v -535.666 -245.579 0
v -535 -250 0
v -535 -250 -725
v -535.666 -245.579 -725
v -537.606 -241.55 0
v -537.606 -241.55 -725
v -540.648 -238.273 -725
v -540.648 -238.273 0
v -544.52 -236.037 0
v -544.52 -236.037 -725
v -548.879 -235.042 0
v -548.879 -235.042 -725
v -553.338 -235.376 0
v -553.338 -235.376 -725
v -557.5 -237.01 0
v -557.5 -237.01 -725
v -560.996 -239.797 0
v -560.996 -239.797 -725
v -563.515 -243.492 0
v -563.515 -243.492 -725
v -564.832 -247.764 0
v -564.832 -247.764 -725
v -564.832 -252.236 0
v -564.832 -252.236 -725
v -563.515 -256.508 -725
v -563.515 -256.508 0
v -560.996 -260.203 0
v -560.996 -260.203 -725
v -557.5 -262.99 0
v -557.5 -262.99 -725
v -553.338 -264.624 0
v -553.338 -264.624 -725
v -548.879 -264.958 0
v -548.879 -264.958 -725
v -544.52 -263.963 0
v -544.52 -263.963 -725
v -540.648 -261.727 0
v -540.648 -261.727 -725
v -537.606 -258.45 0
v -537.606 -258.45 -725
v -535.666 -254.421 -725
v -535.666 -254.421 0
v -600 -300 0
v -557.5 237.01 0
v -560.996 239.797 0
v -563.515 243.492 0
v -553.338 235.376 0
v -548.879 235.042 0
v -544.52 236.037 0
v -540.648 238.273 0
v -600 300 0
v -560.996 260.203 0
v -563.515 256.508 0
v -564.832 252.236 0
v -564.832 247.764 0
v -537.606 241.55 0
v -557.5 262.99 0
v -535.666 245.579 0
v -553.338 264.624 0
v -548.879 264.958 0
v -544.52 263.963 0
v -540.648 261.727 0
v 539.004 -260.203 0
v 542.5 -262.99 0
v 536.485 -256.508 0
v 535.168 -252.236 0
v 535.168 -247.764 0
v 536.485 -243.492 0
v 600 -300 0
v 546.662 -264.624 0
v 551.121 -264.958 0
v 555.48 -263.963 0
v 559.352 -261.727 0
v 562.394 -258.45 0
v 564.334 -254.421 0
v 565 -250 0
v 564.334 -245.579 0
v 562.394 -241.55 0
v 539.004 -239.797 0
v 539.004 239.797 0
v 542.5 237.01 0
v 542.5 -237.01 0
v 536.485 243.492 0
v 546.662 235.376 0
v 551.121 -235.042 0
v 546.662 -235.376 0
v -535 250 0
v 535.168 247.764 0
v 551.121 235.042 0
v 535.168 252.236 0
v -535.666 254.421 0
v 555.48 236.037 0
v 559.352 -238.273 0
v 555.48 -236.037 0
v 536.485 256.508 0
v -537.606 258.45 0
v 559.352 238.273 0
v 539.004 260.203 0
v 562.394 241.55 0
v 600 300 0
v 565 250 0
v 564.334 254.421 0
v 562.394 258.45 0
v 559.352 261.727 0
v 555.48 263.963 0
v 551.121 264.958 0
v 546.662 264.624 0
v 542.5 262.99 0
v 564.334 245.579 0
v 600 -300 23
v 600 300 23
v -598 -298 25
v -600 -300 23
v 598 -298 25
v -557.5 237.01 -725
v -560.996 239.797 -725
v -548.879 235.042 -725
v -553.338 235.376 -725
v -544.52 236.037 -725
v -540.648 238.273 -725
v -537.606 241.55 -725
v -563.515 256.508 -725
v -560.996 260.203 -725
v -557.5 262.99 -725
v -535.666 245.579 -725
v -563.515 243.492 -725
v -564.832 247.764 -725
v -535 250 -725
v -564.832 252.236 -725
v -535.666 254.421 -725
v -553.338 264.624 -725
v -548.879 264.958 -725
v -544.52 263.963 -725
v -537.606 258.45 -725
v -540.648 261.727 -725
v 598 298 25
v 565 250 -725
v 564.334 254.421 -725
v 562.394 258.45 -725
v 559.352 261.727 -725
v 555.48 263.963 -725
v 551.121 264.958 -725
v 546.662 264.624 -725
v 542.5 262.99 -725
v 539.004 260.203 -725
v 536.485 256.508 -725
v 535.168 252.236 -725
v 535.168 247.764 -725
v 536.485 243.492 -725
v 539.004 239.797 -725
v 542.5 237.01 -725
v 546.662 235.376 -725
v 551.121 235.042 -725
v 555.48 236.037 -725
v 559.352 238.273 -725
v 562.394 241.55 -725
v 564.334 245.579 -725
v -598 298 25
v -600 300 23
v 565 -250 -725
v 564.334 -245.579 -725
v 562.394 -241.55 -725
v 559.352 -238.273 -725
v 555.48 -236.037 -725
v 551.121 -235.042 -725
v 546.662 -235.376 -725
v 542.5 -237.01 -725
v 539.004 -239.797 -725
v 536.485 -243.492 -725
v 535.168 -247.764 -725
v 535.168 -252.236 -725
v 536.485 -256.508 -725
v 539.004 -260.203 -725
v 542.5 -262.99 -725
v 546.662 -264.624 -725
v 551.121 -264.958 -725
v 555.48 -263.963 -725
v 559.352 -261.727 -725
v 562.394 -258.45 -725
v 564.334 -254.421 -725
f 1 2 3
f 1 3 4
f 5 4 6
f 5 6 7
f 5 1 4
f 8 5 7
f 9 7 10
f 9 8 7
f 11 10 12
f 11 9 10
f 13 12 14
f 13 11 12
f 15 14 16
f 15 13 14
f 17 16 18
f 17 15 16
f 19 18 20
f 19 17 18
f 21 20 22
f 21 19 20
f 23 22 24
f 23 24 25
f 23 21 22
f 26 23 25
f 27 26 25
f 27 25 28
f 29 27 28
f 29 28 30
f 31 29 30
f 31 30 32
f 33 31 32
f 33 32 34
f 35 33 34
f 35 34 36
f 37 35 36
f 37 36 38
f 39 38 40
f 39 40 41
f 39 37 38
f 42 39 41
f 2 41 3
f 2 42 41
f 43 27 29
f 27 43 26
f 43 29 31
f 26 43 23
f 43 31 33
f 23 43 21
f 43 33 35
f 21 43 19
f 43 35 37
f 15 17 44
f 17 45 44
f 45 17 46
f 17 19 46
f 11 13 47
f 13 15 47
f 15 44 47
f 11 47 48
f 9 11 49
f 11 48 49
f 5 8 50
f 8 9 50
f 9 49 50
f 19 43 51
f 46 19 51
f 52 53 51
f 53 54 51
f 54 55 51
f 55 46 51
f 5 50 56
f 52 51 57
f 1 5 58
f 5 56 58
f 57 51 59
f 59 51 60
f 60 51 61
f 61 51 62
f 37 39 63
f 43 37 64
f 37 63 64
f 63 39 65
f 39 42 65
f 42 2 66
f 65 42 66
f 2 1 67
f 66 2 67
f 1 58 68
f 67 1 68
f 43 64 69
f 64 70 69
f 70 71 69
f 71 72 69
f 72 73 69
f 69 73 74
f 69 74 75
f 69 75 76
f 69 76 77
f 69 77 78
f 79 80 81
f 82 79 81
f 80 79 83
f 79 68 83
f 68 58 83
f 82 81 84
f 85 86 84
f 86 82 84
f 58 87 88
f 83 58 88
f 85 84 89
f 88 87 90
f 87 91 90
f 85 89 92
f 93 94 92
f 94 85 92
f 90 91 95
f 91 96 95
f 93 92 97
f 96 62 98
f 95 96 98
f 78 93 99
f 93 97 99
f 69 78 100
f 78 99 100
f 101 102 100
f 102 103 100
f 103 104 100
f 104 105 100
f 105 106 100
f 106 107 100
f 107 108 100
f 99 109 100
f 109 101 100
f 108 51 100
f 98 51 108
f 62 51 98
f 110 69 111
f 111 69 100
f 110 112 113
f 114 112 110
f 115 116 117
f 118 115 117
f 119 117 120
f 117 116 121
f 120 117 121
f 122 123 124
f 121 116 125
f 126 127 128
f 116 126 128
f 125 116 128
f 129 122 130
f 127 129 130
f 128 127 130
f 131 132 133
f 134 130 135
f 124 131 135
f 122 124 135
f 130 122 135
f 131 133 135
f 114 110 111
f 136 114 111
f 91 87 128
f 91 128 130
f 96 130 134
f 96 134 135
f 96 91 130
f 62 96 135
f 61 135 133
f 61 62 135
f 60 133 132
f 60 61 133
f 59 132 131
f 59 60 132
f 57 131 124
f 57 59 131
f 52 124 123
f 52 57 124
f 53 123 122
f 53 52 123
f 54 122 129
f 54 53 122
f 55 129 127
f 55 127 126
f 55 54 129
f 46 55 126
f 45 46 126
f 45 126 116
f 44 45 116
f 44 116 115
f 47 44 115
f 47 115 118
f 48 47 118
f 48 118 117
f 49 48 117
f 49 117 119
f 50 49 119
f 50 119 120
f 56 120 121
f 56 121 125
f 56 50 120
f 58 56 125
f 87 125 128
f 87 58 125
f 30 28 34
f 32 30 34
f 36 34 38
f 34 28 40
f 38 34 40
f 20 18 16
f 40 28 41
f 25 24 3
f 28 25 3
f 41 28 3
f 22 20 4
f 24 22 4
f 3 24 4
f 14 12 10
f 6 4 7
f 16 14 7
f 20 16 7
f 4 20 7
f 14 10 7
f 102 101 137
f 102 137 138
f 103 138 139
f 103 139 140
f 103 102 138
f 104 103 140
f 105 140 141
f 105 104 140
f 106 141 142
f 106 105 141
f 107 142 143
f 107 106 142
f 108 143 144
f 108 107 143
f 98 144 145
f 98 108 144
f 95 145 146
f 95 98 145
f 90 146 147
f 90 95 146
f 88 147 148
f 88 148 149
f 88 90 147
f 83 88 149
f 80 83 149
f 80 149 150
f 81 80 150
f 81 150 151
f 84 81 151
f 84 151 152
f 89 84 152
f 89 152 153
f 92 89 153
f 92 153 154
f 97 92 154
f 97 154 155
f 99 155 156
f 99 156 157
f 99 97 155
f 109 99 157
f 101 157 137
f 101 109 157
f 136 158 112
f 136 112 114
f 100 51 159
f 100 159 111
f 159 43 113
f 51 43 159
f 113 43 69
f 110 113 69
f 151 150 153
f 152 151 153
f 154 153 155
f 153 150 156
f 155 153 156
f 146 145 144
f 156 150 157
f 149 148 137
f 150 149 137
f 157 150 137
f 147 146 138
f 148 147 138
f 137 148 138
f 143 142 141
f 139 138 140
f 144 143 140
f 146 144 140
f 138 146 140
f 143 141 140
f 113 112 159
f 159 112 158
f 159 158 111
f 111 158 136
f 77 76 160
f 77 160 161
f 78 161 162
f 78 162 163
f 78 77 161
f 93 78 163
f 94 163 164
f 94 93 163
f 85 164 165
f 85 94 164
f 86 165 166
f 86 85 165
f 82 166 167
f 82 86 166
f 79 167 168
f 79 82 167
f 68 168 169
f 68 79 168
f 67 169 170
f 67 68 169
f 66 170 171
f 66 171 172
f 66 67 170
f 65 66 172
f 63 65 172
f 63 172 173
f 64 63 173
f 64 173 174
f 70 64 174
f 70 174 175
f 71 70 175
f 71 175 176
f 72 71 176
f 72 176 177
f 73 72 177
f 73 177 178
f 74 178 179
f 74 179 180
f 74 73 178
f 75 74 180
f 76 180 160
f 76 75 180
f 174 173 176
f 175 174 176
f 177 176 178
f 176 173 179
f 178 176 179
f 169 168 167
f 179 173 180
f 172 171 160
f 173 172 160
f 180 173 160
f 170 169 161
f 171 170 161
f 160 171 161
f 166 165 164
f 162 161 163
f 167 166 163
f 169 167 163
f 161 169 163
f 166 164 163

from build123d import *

# Parameters (mm, degrees)
SKETCH1_W           = 1200
SKETCH1_H           = 600
BOSS_EXTRUDE1_DEPTH = 25
SKETCH2_R           = 15
BOSS_EXTRUDE2_DEPTH = 725
CHAMFER1_SIZE       = 2


with BuildPart() as part:
    # Sketch1 → Boss-Extrude1 (new body)
    with BuildSketch(Plane.XY):
        Rectangle(SKETCH1_W, SKETCH1_H)
    extrude(amount=BOSS_EXTRUDE1_DEPTH)

    # Sketch2 → Boss-Extrude2 (add)
    with BuildSketch(Plane.XY):
        with Locations((550, 250)):
            Circle(SKETCH2_R)
        with Locations((-550, 250)):
            Circle(SKETCH2_R)
        with Locations((-550, -250)):
            Circle(SKETCH2_R)
        with Locations((550, -250)):
            Circle(SKETCH2_R)
    extrude(amount=-BOSS_EXTRUDE2_DEPTH)

    # Chamfer1
    chamfer1_edges = [part.edges().sort_by_distance(p)[0] for p in [
        (-600, 0, 25),
        (0, -300, 25),
        (600, 0, 25),
        (0, 300, 25),
    ]]
    chamfer(chamfer1_edges, length=CHAMFER1_SIZE)


solid = part.part
